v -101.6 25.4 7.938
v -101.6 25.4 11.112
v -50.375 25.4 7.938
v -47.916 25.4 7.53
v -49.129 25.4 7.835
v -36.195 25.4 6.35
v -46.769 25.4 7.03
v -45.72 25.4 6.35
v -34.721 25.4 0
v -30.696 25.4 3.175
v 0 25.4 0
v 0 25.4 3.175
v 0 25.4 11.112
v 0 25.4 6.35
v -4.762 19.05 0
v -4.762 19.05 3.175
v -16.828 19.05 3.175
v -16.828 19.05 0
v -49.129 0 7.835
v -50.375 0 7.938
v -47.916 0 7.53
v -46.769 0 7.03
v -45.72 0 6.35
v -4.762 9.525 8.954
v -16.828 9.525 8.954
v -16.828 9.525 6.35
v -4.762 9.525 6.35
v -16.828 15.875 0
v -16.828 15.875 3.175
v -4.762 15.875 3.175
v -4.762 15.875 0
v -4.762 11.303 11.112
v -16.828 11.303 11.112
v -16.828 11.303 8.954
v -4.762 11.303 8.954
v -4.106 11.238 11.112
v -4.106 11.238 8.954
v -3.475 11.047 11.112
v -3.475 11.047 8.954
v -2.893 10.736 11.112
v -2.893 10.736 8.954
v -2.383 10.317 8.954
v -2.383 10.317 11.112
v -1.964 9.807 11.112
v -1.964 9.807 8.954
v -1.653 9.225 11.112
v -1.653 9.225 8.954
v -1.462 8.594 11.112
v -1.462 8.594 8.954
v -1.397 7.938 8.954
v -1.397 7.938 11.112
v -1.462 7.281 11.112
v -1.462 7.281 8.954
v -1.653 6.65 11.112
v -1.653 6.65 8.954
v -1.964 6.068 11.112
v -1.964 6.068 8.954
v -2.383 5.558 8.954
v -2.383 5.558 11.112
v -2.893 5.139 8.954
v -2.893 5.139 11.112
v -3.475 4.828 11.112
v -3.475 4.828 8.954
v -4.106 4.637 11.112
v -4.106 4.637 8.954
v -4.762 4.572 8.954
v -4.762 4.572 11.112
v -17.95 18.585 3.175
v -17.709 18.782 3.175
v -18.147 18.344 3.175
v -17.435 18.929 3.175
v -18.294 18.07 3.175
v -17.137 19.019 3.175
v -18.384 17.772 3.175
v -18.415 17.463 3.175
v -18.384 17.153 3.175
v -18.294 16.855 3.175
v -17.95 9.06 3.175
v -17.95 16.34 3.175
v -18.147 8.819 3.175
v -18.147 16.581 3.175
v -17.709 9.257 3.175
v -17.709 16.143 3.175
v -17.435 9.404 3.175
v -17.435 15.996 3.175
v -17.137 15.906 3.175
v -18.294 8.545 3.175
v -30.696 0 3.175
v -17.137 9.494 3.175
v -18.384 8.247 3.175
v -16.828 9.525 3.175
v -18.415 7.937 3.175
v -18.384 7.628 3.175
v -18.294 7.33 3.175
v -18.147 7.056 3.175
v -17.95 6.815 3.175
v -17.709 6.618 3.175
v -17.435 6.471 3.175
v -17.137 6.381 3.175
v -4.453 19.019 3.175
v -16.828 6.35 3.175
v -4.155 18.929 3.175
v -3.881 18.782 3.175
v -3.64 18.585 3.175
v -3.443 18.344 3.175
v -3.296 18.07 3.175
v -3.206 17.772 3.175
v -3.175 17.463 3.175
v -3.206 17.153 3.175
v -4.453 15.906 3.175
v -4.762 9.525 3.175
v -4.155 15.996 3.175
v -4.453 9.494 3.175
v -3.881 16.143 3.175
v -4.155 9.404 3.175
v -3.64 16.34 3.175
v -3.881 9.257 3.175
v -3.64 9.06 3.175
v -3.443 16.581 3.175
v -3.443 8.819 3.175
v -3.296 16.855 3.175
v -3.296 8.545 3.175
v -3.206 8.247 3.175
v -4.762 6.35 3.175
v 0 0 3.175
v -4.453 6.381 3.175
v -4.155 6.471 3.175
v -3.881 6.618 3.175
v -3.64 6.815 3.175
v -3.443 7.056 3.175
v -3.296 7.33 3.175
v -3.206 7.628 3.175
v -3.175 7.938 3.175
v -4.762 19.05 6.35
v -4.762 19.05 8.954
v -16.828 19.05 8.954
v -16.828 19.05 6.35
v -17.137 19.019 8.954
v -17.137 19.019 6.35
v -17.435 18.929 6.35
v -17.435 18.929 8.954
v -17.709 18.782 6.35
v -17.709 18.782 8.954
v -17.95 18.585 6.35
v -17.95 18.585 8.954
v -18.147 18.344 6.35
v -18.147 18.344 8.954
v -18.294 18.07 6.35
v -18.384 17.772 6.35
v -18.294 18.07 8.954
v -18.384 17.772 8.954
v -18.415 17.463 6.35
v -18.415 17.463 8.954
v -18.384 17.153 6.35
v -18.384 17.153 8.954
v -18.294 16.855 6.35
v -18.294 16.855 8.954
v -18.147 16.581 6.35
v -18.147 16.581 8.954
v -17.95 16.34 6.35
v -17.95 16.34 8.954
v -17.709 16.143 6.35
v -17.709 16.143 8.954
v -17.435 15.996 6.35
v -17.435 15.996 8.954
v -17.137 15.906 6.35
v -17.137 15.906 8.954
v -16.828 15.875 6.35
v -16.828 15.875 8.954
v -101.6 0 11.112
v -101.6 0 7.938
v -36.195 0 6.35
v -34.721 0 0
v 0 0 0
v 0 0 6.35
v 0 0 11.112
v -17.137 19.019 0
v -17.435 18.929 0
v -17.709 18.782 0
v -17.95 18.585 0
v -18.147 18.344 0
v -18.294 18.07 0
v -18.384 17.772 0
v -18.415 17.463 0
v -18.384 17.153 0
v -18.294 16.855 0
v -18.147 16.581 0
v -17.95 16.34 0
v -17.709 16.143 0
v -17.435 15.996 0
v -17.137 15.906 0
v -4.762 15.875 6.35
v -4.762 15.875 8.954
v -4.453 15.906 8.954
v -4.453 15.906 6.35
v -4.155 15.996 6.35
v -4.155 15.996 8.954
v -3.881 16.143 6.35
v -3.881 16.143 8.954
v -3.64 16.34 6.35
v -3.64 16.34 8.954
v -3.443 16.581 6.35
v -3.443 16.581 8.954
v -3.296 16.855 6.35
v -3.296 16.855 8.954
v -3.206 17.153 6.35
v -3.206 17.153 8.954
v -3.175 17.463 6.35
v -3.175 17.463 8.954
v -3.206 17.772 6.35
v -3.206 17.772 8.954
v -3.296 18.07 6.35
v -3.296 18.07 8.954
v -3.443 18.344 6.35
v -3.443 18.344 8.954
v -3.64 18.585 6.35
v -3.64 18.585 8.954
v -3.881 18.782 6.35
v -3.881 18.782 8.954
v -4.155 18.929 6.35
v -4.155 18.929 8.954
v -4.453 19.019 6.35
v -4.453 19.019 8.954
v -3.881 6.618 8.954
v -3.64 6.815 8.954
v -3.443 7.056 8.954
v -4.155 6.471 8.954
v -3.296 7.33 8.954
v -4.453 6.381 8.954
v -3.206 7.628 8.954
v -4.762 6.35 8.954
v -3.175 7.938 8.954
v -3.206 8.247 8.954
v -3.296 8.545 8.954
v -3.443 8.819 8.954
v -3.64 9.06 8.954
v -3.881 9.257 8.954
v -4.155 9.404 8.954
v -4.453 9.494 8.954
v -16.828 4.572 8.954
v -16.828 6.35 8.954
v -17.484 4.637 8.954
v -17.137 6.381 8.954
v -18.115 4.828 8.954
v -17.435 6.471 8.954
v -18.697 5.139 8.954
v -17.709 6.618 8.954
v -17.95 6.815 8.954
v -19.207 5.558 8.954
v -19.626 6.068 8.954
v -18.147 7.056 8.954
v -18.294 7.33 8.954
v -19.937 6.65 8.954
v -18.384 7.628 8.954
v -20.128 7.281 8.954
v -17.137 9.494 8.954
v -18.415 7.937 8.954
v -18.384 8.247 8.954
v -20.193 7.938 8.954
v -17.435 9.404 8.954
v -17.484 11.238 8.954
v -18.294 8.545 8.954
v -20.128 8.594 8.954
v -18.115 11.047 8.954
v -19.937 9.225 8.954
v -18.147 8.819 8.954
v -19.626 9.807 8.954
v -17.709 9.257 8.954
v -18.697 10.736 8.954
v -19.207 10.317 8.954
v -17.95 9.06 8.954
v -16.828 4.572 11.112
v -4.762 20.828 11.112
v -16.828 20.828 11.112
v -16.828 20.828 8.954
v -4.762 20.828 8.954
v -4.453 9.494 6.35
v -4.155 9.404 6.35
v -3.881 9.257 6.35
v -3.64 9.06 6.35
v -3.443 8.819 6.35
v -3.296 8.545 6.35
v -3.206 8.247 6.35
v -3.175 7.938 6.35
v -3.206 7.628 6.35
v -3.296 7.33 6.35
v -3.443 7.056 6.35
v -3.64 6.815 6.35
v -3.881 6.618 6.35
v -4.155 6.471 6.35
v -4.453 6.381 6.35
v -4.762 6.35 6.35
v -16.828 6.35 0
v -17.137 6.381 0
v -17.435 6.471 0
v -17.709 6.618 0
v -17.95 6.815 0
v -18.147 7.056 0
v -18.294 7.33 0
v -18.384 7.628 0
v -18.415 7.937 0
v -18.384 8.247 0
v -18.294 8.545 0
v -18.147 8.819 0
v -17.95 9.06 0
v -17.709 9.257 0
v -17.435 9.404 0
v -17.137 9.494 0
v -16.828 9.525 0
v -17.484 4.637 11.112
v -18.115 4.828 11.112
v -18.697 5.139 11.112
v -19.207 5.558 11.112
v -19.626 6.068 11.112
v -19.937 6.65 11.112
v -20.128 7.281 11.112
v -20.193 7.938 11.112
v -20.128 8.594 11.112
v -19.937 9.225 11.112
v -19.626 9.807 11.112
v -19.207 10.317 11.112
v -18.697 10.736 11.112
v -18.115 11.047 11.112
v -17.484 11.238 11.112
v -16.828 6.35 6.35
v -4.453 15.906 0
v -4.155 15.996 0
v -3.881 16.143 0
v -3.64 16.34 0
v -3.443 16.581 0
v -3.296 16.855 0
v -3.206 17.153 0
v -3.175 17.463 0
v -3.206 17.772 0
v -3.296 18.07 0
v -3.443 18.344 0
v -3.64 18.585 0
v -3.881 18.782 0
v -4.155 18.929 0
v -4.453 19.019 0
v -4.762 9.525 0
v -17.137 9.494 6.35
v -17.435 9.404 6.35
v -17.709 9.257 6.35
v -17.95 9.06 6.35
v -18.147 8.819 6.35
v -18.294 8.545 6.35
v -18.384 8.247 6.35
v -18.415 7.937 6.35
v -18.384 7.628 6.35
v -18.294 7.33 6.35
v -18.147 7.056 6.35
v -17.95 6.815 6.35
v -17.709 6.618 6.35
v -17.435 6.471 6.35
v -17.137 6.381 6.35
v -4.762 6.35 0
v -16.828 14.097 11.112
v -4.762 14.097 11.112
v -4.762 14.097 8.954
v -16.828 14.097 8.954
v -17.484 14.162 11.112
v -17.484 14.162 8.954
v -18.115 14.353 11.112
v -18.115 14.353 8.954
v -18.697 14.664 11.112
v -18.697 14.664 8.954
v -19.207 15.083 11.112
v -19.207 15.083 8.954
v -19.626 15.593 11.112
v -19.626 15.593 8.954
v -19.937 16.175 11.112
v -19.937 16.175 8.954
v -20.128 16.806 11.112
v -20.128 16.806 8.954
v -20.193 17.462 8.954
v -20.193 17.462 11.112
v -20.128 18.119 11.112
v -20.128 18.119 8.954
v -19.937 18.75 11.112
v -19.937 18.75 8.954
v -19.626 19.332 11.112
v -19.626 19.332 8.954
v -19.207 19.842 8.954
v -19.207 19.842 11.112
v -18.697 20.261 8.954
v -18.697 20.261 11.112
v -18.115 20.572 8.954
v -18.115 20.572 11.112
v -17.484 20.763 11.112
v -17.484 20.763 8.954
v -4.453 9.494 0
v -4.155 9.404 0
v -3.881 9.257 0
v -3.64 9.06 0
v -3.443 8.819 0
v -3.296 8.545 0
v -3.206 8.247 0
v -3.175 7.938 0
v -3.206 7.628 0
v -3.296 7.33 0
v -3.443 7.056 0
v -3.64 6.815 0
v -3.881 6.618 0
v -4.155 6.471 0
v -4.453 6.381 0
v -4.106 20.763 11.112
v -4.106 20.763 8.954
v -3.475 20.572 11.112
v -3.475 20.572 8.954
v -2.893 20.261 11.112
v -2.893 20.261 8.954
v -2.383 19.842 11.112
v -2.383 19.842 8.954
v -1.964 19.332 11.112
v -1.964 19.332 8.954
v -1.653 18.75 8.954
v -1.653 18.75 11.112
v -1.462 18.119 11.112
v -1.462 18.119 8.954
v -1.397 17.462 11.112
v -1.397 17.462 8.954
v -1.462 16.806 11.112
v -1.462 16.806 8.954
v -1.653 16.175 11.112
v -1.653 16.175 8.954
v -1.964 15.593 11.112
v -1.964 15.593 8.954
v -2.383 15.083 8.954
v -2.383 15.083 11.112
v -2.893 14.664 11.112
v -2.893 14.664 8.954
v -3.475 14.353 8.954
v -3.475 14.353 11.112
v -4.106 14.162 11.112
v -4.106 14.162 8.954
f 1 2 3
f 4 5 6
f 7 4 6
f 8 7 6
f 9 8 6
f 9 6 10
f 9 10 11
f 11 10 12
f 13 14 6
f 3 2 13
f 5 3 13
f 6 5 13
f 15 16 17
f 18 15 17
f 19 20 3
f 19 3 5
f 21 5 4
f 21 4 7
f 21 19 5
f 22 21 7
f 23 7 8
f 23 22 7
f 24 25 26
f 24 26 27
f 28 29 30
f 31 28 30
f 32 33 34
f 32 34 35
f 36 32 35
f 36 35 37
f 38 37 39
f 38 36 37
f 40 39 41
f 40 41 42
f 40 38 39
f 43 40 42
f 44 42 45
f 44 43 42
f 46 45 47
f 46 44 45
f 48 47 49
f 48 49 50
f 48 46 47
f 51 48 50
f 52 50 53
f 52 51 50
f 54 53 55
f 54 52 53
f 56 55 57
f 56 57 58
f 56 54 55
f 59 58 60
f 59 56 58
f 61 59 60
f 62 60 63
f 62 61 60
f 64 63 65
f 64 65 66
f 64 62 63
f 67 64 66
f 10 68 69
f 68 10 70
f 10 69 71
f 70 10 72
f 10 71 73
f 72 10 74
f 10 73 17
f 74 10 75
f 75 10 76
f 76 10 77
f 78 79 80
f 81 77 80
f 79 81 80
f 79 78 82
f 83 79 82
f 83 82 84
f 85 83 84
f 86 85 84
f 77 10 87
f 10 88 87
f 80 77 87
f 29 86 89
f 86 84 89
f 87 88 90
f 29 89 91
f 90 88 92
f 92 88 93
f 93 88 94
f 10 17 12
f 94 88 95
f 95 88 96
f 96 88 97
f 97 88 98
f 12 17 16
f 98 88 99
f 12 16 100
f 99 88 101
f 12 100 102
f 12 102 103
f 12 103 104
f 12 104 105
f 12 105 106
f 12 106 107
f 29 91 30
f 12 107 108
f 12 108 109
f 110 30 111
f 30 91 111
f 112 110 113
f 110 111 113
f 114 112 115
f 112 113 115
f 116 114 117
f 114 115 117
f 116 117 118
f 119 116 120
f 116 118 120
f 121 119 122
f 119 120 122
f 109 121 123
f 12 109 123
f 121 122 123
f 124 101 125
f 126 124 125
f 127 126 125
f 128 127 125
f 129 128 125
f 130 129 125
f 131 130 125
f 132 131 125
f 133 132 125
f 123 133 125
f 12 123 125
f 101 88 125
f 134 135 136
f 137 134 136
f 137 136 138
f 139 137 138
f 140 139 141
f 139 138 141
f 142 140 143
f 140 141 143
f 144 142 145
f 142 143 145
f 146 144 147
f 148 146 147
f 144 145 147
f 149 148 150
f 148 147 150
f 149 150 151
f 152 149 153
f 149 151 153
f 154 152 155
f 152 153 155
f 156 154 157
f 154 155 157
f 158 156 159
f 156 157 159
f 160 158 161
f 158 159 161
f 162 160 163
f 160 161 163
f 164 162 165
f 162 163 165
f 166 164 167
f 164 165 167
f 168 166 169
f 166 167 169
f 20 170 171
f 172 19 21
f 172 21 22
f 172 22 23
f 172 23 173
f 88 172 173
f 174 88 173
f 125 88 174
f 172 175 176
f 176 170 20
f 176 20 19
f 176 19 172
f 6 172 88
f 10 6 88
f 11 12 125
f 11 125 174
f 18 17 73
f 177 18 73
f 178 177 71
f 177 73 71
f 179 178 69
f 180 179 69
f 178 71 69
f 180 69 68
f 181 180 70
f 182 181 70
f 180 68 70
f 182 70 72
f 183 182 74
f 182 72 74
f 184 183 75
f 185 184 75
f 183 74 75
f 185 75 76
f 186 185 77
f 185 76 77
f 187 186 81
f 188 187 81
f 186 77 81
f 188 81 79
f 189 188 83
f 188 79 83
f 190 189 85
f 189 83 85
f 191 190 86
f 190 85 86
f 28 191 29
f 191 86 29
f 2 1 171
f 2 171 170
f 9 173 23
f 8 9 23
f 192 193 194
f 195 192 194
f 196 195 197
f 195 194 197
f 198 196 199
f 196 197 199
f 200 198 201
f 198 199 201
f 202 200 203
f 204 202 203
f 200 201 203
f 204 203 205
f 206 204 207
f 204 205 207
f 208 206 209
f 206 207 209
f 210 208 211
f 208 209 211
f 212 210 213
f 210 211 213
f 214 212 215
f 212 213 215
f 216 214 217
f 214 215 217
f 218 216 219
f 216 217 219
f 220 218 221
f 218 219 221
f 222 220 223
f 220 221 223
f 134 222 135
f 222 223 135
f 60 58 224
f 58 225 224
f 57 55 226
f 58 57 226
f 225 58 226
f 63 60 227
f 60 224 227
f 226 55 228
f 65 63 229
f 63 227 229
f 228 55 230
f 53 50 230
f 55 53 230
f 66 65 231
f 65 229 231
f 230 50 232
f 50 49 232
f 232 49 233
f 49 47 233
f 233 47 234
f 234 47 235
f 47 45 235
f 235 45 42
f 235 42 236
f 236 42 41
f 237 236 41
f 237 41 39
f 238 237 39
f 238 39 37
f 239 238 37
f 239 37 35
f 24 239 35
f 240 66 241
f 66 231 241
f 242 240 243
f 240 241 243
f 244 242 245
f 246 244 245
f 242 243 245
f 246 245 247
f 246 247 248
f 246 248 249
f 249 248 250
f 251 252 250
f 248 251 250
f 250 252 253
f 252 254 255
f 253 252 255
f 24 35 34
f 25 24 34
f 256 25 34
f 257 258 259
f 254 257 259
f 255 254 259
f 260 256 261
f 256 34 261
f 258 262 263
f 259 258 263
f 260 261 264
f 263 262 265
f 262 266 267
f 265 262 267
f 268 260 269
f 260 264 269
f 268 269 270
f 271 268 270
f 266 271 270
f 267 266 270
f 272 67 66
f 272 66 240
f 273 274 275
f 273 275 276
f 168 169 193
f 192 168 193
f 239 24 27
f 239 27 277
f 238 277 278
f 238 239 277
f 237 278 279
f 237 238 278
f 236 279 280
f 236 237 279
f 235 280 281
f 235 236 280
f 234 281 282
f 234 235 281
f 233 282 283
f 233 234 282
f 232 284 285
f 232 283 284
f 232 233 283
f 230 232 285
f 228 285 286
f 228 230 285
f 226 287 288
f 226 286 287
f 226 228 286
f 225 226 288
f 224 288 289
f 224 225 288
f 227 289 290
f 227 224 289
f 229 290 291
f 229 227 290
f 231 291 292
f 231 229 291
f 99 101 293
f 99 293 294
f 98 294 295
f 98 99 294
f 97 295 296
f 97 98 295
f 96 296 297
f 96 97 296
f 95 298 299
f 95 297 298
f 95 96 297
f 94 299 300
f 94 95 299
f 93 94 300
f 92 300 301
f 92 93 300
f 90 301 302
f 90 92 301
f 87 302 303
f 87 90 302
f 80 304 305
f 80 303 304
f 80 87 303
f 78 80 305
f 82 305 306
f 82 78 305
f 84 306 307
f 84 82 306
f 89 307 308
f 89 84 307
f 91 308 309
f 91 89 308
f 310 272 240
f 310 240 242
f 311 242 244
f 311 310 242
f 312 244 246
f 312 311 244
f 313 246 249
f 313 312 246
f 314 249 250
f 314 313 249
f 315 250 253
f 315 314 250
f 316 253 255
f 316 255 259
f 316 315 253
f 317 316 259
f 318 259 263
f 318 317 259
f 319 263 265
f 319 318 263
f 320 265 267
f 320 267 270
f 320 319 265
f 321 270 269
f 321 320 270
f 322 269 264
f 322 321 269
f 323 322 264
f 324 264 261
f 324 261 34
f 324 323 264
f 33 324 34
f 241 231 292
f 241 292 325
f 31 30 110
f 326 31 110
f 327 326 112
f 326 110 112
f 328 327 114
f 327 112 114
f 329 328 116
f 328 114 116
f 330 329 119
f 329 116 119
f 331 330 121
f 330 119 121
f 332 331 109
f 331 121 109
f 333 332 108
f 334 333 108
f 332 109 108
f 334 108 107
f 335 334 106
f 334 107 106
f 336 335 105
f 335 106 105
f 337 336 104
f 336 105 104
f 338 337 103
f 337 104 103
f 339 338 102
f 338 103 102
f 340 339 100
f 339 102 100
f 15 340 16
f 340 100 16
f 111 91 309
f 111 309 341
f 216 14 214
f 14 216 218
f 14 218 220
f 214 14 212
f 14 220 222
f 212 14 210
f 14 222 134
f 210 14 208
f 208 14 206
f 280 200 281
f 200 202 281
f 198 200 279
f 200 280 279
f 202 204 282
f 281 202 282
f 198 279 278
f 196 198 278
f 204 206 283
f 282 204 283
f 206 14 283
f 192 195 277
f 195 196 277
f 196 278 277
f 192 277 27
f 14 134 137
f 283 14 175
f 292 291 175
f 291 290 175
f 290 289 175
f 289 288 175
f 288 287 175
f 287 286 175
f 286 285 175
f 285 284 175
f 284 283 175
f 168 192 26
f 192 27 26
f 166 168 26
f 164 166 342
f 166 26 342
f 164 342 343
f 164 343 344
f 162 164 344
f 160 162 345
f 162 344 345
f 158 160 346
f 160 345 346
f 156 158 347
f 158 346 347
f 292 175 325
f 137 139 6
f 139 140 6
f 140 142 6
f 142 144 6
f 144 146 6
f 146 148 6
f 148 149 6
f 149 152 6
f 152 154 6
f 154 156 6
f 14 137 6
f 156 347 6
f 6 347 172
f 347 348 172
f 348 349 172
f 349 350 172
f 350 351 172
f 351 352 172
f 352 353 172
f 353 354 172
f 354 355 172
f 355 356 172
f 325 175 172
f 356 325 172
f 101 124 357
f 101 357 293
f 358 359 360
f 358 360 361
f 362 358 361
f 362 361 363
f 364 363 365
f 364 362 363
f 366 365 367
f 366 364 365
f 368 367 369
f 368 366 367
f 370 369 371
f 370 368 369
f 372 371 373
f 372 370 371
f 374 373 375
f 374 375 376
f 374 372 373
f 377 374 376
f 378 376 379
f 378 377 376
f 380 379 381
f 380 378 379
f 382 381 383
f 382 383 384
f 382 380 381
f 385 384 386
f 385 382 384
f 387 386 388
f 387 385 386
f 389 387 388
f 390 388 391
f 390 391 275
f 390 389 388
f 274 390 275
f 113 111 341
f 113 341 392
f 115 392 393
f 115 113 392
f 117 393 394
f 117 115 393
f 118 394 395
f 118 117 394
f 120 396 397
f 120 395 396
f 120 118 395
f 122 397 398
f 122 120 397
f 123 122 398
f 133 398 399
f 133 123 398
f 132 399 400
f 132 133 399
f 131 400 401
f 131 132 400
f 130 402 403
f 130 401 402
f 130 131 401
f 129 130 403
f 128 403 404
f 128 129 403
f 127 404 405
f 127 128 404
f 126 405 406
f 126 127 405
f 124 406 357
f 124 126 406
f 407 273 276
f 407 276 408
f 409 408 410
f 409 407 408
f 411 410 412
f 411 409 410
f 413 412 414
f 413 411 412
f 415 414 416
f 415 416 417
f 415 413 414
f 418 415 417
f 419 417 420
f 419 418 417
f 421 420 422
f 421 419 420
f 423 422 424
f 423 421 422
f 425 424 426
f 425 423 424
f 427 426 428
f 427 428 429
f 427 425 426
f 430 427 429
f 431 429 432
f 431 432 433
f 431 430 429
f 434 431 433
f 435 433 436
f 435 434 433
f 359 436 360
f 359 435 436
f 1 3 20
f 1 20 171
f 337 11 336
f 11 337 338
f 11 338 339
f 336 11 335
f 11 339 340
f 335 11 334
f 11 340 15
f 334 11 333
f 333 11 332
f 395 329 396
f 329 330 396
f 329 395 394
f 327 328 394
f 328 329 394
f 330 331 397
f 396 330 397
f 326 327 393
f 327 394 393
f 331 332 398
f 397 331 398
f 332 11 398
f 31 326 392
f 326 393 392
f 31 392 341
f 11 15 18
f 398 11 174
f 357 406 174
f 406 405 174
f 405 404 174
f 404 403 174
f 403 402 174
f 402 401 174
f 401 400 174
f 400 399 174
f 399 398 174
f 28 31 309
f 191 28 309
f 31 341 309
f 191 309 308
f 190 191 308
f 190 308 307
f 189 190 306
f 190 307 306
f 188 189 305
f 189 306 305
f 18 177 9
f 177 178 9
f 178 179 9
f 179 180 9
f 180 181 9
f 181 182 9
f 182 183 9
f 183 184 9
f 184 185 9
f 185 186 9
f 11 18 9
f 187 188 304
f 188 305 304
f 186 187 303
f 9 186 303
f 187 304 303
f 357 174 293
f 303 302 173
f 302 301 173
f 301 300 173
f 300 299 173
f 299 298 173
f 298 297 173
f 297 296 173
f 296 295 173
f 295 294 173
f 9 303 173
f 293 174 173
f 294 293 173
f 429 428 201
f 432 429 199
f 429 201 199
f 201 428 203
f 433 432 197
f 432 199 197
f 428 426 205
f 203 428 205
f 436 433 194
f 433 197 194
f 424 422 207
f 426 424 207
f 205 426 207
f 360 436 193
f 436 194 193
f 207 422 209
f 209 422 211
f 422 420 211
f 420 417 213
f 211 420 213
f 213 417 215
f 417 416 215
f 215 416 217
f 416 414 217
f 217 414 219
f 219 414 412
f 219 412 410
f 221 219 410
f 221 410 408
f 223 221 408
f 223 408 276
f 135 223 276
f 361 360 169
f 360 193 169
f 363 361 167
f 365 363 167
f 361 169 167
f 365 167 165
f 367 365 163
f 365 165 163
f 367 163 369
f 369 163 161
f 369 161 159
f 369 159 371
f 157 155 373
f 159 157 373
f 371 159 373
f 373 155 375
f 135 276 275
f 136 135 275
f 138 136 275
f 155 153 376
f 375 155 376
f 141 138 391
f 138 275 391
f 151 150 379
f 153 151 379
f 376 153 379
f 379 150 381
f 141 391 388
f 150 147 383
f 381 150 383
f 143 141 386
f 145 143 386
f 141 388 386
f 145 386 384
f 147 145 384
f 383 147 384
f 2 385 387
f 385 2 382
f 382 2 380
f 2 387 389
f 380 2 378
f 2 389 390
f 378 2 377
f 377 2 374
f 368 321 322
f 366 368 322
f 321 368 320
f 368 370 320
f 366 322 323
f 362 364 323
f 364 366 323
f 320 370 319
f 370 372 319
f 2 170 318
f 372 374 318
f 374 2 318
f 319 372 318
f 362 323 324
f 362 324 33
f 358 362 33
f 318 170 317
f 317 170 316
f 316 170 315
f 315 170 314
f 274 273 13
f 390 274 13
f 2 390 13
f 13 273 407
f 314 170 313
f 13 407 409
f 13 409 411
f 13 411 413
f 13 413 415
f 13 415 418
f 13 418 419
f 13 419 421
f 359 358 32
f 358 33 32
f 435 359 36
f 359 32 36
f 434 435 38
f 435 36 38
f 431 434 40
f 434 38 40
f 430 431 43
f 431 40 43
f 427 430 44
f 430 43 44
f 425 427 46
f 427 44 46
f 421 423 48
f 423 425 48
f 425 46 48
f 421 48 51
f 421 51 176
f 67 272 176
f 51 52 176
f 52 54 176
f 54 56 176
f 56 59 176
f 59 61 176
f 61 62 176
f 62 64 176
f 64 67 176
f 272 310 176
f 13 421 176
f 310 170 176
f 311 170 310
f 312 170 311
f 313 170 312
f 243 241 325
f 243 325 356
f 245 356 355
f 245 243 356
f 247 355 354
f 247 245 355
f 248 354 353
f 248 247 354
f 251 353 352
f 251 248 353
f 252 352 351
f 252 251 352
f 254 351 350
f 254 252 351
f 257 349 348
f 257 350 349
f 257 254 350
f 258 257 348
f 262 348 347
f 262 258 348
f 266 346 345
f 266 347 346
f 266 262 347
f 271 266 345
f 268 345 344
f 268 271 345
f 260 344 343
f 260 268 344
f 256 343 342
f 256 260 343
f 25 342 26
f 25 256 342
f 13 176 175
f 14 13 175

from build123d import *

# Parameters (mm, degrees)
BOSS_EXTRUDE1_DEPTH = 25.4
SKETCH3_W           = 55.88
SKETCH3_H           = 25.4
CUT_EXTRUDE1_DEPTH  = 1.5875
FILLET1_R           = 7.62
CUT_EXTRUDE2_REACH  = 107.315
CUT_EXTRUDE3_DEPTH  = 2.159


with BuildPart() as part:
    # Sketch1 → Boss-Extrude1 (new body)
    with BuildSketch(Plane(origin=(0, 0, 0), x_dir=(1, 0, 0), z_dir=(0, 1, 0))):
        Polygon((-22.587652327, -6.35), (-36.195, -6.35), (-30.695738686, -3.175), (-15.498938433, -3.175), (0, -3.175), (0, 0), (-34.721477372, 0), (-45.72, -6.35), (-101.6, -6.35), (-101.6, -11.1125), (0, -11.1125), (0, -6.35), (-15.498938433, -6.35), align=None)
    extrude(amount=BOSS_EXTRUDE1_DEPTH)

    # Sketch3 → Cut-Extrude1 (cut)
    with BuildSketch(Plane(origin=(0, 0, 6.35), x_dir=(-1, 0, 0), z_dir=(0, 0, -1))):
        with Locations((73.66, 12.7)):
            Rectangle(SKETCH3_W, SKETCH3_H)
    extrude(amount=-CUT_EXTRUDE1_DEPTH, mode=Mode.SUBTRACT)

    # Fillet1
    # the kernel refuses this fillet: 7.62 mm, written as the material it adds along each edge
    with BuildSketch(Plane(origin=(-45.72, 0, 7.9375), x_dir=(-1, 0, 0), z_dir=(0, 1, 0))) as fillet1_piece_1:
        with BuildLine():
            CenterArc((4.65546386, -7.62), FILLET1_R, 90, 37.658462006)
            Line((0, -1.5875), (-0.093109277, -1.46685))
            ThreePointArc((-0.093109277, -1.46685), (-0.1524, -0.79375), (-0.1524, 0))
            Line((-0.1524, 0), (0, 0.1524))
            Line((0, 0.1524), (4.65546386, 0.1524))
            Line((4.65546386, 0.1524), (4.65546386, 0))
        make_face()
    extrude(amount=25.4)

    # Cut-Extrude2: up to this face of the body (flat: up to its plane)
    cut_extrude2_end = Plane(part.part.faces().sort_by_distance((-17.360738686, 12.7, 0))[0])
    # Sketch4 → Cut-Extrude2 (cut, up to the picked face)
    with BuildSketch(Plane.XY.offset(11.1125), mode=Mode.PRIVATE) as cut_extrude2_sk1:
        with BuildLine():
            Line((-4.7625, 19.05), (-16.8275, 19.05))
            ThreePointArc((-16.8275, 19.05), (-18.415, 17.4625), (-16.8275, 15.875))
            Line((-16.8275, 15.875), (-4.7625, 15.875))
            ThreePointArc((-4.7625, 15.875), (-3.175, 17.4625), (-4.7625, 19.05))
        make_face()
    cut_extrude2_tool1 = split(extrude(cut_extrude2_sk1.sketch, amount=-CUT_EXTRUDE2_REACH, mode=Mode.PRIVATE), bisect_by=cut_extrude2_end, keep=Keep.BOTH, mode=Mode.PRIVATE)
    # Sketch4 → Cut-Extrude2 (cut, up to the picked face)
    with BuildSketch(Plane.XY.offset(11.1125), mode=Mode.PRIVATE) as cut_extrude2_sk2:
        with BuildLine():
            Line((-4.7625, 6.35), (-16.8275, 6.35))
            ThreePointArc((-16.8275, 6.35), (-18.415, 7.9375), (-16.8275, 9.525))
            Line((-16.8275, 9.525), (-4.7625, 9.525))
            ThreePointArc((-4.7625, 9.525), (-3.175, 7.9375), (-4.7625, 6.35))
        make_face()
    cut_extrude2_tool2 = split(extrude(cut_extrude2_sk2.sketch, amount=-CUT_EXTRUDE2_REACH, mode=Mode.PRIVATE), bisect_by=cut_extrude2_end, keep=Keep.BOTH, mode=Mode.PRIVATE)
    add(cut_extrude2_tool1.solids().sort_by(Axis((-10.795, 17.4625, 11.1125), (0, 0, -1)))[0], mode=Mode.SUBTRACT)
    add(cut_extrude2_tool2.solids().sort_by(Axis((-10.795, 7.9375, 11.1125), (0, 0, -1)))[0], mode=Mode.SUBTRACT)

    # Sketch5 → Cut-Extrude3 (cut)
    with BuildSketch(Plane.XY.offset(11.1125)):
        with BuildLine():
            Line((-4.7625, 4.572), (-16.8275, 4.572))
            ThreePointArc((-16.8275, 4.572), (-20.193, 7.9375), (-16.8275, 11.303))
            Line((-16.8275, 11.303), (-4.7625, 11.303))
            ThreePointArc((-4.7625, 11.303), (-1.397, 7.9375), (-4.7625, 4.572))
        make_face()
        with BuildLine():
            Line((-4.7625, 14.097), (-16.8275, 14.097))
            ThreePointArc((-16.8275, 14.097), (-20.193, 17.4625), (-16.8275, 20.828))
            Line((-16.8275, 20.828), (-4.7625, 20.828))
            ThreePointArc((-4.7625, 20.828), (-1.397, 17.4625), (-4.7625, 14.097))
        make_face()
    extrude(amount=-CUT_EXTRUDE3_DEPTH, mode=Mode.SUBTRACT)


solid = part.part
